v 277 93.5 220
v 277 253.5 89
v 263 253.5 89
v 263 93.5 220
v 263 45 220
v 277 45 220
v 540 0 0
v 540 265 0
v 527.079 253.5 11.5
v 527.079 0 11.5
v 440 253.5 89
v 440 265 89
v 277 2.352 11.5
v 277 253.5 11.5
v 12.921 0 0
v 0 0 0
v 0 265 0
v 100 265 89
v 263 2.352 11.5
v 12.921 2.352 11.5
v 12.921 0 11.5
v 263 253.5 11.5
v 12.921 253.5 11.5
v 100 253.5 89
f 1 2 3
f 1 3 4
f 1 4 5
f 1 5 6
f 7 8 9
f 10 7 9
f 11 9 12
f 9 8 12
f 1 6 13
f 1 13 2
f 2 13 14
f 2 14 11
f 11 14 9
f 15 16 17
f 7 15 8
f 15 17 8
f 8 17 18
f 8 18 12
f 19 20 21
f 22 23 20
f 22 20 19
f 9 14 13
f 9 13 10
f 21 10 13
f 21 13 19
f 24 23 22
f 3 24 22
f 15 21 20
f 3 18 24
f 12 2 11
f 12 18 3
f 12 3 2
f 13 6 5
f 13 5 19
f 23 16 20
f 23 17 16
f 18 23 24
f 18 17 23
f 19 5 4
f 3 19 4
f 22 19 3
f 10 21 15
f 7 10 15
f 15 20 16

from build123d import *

# Parameters (mm, degrees)
SKETCH_1_W          = 540
SKETCH_1_H          = 265
SKETCH_1_R          = 13
EXTRUDE_635_DEPTH   = 11.5
SKETCH_2_W          = 540
SKETCH_2_H          = 11.5
EXTRUDE_1_DEPTH     = 77.5
CUT_EXTRUDE_1_DEPTH = 609.067430471
SKETCH_4_R          = 13
CUT_EXTRUDE_2_DEPTH = 609.067430471
SKETCH_5_W          = 14
SKETCH_5_H          = 253.5
EXTRUDE_2_DEPTH     = 208.5
SKETCH_6_R          = 13
CUT_EXTRUDE_3_DEPTH = 442.988687638
EXTRUDE_3_DEPTH     = 14
SKETCH_8_W          = 514.15730337
SKETCH_8_H          = 253.5
EXTRUDE_4_DEPTH     = 11.5
EXTRUDE_5_DEPTH     = 11.5


with BuildPart() as part:
    # 草图1 → Extrude 635 (new body)
    with BuildSketch(Plane.XY):
        with Locations((270, 132.5)):
            Rectangle(SKETCH_1_W, SKETCH_1_H)
        with Locations((97.46594539, 108.46594539)):
            Circle(SKETCH_1_R, mode=Mode.SUBTRACT)
        with Locations((40.897402896, 51.897402896)):
            Circle(SKETCH_1_R, mode=Mode.SUBTRACT)
        with Locations((499.102597104, 51.897402896)):
            Circle(SKETCH_1_R, mode=Mode.SUBTRACT)
        with Locations((402.170987639, 92.261534081)):
            Circle(SKETCH_1_R, mode=Mode.SUBTRACT)
        with Locations((230, 121)):
            Circle(SKETCH_1_R, mode=Mode.SUBTRACT)
        with Locations((230, 41)):
            Circle(SKETCH_1_R, mode=Mode.SUBTRACT)
        with Locations((310, 41)):
            Circle(SKETCH_1_R, mode=Mode.SUBTRACT)
        with Locations((310, 121)):
            Circle(SKETCH_1_R, mode=Mode.SUBTRACT)
        with Locations((137.829012361, 92.261534081)):
            Circle(SKETCH_1_R, mode=Mode.SUBTRACT)
        with Locations((442.53405461, 108.46594539)):
            Circle(SKETCH_1_R, mode=Mode.SUBTRACT)
    extrude(amount=EXTRUDE_635_DEPTH)

    # 草图2 → 凸台-拉伸1 (add)
    with BuildSketch(Plane.XY.offset(11.5)):
        with Locations((270, 259.25)):
            Rectangle(SKETCH_2_W, SKETCH_2_H)
    extrude(amount=EXTRUDE_1_DEPTH)

    # 草图3 → 切除-拉伸1 (cut, through all)
    with BuildSketch(Plane(origin=(0, 265, 0), x_dir=(-1, 0, 0), z_dir=(0, 1, 0))):
        Polygon((0, 0), (-100, 89), (0, 89), align=None)
        Polygon((-540, 0), (-440, 89), (-540, 89), align=None)
    extrude(amount=-CUT_EXTRUDE_1_DEPTH, mode=Mode.SUBTRACT)

    # 草图4 → 切除-拉伸2 (cut, through all)
    with BuildSketch(Plane(origin=(0, 265, 0), x_dir=(-1, 0, 0), z_dir=(0, 1, 0))):
        with Locations((-210, 50)):
            Circle(SKETCH_4_R)
        with Locations((-130, 50)):
            Circle(SKETCH_4_R)
        with Locations((-410, 50)):
            Circle(SKETCH_4_R)
        with Locations((-330, 50)):
            Circle(SKETCH_4_R)
    extrude(amount=-CUT_EXTRUDE_2_DEPTH, mode=Mode.SUBTRACT)

    # 草图5 → 凸台-拉伸2 (add)
    with BuildSketch(Plane.XY.offset(11.5)):
        with Locations((270, 126.75)):
            Rectangle(SKETCH_5_W, SKETCH_5_H)
    extrude(amount=EXTRUDE_2_DEPTH)

    # 草图6 → 切除-拉伸3 (cut, through all)
    with BuildSketch(Plane(origin=(277, 0, 0), x_dir=(0, 0, -1), z_dir=(1, 0, 0))):
        with Locations((-115.676148082, 138.142814541)):
            Circle(SKETCH_6_R)
        with Locations((-175.462621788, 84.986652509)):
            Circle(SKETCH_6_R)
        with Locations((-68.377294113, 126.911974174)):
            Circle(SKETCH_6_R)
        Polygon((-89, 253.5), (-220, 93.5), (-220, 253.5), align=None)
        Polygon((-220, 45), (0, 0), (-220, 0), align=None)
    extrude(amount=-CUT_EXTRUDE_3_DEPTH, mode=Mode.SUBTRACT)

    # 草图7 → 凸台-拉伸3 (add)
    with BuildSketch(Plane(origin=(277, 0, 0), x_dir=(0, 0, -1), z_dir=(1, 0, 0))):
        Polygon((-220, 93.5), (-220, 45), (-11.5, 2.352272727), (-11.5, 253.5), (-89, 253.5), align=None)
    extrude(amount=-EXTRUDE_3_DEPTH)

    # 草图8 → 凸台-拉伸4 (add)
    with BuildSketch(Plane.XY.offset(11.5)):
        with Locations((270, 126.75)):
            Rectangle(SKETCH_8_W, SKETCH_8_H)
    extrude(amount=-EXTRUDE_4_DEPTH)

    # 草图9 → 凸台-拉伸5 (add)
    with BuildSketch(Plane(origin=(0, 265, 0), x_dir=(1, 0, 0), z_dir=(0, 1, 0))):
        Polygon((0, 0), (100, -89), (440, -89), (540, 0), align=None)
    extrude(amount=-EXTRUDE_5_DEPTH)


solid = part.part
